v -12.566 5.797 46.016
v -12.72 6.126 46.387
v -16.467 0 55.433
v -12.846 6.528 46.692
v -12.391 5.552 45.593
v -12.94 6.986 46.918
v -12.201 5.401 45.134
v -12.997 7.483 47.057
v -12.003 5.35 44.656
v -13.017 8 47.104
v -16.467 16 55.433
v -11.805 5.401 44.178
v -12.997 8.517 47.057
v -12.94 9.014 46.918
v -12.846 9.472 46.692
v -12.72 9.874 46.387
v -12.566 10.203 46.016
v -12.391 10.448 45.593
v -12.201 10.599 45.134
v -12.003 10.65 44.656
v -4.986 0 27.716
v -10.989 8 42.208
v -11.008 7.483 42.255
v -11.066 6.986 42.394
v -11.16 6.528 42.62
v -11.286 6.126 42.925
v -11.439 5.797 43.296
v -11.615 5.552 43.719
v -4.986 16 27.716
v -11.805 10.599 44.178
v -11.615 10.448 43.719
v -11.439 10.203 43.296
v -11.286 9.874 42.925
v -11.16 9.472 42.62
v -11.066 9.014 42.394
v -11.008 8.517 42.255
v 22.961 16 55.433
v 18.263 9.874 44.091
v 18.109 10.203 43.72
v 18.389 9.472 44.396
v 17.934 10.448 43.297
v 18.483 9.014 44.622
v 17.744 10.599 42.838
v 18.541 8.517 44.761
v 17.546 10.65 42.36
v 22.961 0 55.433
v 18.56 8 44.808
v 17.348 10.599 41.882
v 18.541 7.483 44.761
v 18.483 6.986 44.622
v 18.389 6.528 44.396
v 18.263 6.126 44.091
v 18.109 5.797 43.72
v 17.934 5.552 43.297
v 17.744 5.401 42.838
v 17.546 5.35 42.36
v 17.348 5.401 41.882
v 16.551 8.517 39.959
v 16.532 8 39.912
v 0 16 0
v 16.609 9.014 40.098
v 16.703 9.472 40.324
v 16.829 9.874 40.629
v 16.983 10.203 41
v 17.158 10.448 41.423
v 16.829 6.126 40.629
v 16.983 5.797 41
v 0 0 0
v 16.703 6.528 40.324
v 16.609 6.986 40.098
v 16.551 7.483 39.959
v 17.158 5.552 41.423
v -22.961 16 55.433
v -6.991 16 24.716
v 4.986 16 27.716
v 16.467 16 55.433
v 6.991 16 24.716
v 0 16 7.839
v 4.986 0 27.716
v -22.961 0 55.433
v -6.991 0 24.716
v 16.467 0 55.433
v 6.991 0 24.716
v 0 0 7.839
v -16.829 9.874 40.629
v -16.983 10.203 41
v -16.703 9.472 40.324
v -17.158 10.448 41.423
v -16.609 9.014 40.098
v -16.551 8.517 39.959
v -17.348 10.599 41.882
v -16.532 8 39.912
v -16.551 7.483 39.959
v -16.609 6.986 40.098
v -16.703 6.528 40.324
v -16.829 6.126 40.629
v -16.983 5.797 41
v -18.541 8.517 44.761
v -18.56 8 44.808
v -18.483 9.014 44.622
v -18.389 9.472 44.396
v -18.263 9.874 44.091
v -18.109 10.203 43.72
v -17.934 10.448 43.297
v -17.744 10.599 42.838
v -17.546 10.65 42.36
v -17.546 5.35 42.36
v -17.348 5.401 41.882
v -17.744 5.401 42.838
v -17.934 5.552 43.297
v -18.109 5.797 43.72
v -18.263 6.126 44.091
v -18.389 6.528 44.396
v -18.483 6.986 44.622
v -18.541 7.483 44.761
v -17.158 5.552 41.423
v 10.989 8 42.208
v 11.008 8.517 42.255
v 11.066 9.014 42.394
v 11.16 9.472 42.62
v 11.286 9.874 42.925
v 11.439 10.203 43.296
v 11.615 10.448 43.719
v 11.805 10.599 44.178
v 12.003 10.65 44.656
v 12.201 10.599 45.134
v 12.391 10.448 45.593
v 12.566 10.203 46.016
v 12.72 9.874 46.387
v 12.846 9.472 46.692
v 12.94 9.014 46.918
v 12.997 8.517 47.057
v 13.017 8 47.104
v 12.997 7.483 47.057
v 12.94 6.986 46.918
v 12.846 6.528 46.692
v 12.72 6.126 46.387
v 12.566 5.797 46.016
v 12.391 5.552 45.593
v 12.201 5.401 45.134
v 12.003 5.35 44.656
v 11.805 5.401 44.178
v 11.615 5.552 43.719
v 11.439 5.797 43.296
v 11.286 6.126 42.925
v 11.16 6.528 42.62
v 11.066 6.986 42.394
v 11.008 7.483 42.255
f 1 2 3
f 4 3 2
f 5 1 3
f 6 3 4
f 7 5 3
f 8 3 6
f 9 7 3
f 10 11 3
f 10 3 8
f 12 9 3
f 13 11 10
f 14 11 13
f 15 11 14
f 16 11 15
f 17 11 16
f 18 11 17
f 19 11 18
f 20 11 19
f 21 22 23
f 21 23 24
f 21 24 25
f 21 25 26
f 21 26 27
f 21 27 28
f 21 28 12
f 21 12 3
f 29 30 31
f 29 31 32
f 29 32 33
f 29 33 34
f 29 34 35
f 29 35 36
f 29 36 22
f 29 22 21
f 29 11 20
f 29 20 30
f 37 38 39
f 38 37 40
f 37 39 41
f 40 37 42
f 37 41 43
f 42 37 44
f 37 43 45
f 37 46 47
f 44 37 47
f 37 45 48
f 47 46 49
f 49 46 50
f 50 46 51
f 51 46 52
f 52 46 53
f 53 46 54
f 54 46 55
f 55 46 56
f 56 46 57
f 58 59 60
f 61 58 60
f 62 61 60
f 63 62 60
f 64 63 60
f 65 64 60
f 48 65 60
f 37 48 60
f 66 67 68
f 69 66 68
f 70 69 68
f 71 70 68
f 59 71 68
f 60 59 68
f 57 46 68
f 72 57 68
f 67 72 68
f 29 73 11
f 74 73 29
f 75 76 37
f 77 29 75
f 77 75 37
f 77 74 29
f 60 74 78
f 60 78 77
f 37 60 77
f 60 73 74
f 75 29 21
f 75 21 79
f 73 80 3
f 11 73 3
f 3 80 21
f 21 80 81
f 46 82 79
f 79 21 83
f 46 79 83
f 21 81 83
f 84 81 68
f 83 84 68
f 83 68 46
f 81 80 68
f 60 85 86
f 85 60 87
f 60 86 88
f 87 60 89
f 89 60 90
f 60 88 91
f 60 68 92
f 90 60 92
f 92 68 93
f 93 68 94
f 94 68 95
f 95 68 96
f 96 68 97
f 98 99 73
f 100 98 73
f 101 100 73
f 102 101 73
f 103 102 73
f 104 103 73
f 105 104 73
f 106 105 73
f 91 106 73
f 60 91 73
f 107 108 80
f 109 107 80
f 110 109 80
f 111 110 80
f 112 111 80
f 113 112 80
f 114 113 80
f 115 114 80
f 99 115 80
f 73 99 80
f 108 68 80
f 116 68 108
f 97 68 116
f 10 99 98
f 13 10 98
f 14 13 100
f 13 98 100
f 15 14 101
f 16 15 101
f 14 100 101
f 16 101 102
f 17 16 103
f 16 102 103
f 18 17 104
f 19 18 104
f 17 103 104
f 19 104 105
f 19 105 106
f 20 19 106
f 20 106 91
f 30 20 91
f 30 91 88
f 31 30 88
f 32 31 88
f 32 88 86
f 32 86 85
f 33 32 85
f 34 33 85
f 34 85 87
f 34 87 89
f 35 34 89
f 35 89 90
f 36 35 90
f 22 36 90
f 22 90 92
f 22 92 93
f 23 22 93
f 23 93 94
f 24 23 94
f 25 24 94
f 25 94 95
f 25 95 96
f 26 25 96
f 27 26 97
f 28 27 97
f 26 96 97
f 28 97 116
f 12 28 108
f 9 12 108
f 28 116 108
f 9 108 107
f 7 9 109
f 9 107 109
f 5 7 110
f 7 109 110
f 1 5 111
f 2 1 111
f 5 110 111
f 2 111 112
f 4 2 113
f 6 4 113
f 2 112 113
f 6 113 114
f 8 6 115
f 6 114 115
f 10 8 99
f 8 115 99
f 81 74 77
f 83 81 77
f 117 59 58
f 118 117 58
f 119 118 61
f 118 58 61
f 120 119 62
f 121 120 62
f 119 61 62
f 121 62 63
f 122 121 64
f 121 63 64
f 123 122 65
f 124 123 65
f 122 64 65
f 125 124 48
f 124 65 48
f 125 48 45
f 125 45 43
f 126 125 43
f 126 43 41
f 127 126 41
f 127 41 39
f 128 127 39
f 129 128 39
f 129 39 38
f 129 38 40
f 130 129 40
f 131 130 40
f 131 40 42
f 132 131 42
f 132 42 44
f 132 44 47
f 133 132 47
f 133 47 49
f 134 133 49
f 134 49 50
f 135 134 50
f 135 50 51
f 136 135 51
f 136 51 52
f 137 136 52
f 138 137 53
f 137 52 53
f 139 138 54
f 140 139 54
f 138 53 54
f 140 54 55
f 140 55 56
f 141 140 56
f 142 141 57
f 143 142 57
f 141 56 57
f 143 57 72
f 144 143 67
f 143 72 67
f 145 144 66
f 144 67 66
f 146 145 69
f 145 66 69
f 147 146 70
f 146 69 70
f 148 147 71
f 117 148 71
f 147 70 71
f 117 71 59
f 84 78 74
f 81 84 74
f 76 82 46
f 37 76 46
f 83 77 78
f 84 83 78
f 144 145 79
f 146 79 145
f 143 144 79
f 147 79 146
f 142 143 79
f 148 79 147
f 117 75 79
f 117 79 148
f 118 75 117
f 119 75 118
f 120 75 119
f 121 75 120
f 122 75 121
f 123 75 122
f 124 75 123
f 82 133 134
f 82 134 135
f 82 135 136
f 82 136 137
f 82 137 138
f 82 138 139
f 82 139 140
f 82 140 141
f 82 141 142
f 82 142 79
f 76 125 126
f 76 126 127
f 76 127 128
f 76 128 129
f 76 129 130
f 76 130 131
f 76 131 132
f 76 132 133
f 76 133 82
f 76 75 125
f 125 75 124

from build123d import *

# Parameters (mm, degrees)
BOSS_EXTRUDE1_DEPTH = 16
CUT_EXTRUDE1_DEPTH  = 16
SKETCH3_R           = 2.65
CUT_EXTRUDE2_DEPTH  = 16
SKETCH4_R           = 2.65
CUT_EXTRUDE3_DEPTH  = 16


with BuildPart() as part:
    # Sketch1 → Boss-Extrude1 (new body)
    with BuildSketch(Plane(origin=(0, 0, 0), x_dir=(1, 0, 0), z_dir=(0, 1, 0))):
        Polygon((0, 0), (-22.961005942, -55.432771951), (22.961005942, -55.432771951), align=None)
    extrude(amount=BOSS_EXTRUDE1_DEPTH)

    # Sketch2 → Cut-Extrude1 (cut)
    with BuildSketch(Plane(origin=(0, 16, 0), x_dir=(1, 0, 0), z_dir=(0, 1, 0))):
        Polygon((-16.46665274, -55.432771951), (-4.986149769, -27.716385975), (4.986149769, -27.716385975), (16.46665274, -55.432771951), align=None)
        Polygon((-6.990685683, -24.716385975), (6.990685683, -24.716385975), (0, -7.839377789), align=None)
    extrude(amount=-CUT_EXTRUDE1_DEPTH, mode=Mode.SUBTRACT)

    # Sketch3 → Cut-Extrude2 (cut)
    with BuildSketch(Plane(origin=(0, 0, 0), x_dir=(-0.3826834323650873, 0, -0.9238795325112878), z_dir=(0.9238795325112878, 0, -0.3826834323650873))):
        with Locations((-45.85, 8)):
            Circle(SKETCH3_R)
    extrude(amount=-CUT_EXTRUDE2_DEPTH, mode=Mode.SUBTRACT)

    # Sketch4 → Cut-Extrude3 (cut)
    with BuildSketch(Plane(origin=(0, 0, 0), x_dir=(-0.3826834323650873, 0, 0.9238795325112878), z_dir=(-0.9238795325112878, 0, -0.3826834323650873))):
        with Locations((45.85, 8)):
            Circle(SKETCH4_R)
    extrude(amount=-CUT_EXTRUDE3_DEPTH, mode=Mode.SUBTRACT)


solid = part.part
